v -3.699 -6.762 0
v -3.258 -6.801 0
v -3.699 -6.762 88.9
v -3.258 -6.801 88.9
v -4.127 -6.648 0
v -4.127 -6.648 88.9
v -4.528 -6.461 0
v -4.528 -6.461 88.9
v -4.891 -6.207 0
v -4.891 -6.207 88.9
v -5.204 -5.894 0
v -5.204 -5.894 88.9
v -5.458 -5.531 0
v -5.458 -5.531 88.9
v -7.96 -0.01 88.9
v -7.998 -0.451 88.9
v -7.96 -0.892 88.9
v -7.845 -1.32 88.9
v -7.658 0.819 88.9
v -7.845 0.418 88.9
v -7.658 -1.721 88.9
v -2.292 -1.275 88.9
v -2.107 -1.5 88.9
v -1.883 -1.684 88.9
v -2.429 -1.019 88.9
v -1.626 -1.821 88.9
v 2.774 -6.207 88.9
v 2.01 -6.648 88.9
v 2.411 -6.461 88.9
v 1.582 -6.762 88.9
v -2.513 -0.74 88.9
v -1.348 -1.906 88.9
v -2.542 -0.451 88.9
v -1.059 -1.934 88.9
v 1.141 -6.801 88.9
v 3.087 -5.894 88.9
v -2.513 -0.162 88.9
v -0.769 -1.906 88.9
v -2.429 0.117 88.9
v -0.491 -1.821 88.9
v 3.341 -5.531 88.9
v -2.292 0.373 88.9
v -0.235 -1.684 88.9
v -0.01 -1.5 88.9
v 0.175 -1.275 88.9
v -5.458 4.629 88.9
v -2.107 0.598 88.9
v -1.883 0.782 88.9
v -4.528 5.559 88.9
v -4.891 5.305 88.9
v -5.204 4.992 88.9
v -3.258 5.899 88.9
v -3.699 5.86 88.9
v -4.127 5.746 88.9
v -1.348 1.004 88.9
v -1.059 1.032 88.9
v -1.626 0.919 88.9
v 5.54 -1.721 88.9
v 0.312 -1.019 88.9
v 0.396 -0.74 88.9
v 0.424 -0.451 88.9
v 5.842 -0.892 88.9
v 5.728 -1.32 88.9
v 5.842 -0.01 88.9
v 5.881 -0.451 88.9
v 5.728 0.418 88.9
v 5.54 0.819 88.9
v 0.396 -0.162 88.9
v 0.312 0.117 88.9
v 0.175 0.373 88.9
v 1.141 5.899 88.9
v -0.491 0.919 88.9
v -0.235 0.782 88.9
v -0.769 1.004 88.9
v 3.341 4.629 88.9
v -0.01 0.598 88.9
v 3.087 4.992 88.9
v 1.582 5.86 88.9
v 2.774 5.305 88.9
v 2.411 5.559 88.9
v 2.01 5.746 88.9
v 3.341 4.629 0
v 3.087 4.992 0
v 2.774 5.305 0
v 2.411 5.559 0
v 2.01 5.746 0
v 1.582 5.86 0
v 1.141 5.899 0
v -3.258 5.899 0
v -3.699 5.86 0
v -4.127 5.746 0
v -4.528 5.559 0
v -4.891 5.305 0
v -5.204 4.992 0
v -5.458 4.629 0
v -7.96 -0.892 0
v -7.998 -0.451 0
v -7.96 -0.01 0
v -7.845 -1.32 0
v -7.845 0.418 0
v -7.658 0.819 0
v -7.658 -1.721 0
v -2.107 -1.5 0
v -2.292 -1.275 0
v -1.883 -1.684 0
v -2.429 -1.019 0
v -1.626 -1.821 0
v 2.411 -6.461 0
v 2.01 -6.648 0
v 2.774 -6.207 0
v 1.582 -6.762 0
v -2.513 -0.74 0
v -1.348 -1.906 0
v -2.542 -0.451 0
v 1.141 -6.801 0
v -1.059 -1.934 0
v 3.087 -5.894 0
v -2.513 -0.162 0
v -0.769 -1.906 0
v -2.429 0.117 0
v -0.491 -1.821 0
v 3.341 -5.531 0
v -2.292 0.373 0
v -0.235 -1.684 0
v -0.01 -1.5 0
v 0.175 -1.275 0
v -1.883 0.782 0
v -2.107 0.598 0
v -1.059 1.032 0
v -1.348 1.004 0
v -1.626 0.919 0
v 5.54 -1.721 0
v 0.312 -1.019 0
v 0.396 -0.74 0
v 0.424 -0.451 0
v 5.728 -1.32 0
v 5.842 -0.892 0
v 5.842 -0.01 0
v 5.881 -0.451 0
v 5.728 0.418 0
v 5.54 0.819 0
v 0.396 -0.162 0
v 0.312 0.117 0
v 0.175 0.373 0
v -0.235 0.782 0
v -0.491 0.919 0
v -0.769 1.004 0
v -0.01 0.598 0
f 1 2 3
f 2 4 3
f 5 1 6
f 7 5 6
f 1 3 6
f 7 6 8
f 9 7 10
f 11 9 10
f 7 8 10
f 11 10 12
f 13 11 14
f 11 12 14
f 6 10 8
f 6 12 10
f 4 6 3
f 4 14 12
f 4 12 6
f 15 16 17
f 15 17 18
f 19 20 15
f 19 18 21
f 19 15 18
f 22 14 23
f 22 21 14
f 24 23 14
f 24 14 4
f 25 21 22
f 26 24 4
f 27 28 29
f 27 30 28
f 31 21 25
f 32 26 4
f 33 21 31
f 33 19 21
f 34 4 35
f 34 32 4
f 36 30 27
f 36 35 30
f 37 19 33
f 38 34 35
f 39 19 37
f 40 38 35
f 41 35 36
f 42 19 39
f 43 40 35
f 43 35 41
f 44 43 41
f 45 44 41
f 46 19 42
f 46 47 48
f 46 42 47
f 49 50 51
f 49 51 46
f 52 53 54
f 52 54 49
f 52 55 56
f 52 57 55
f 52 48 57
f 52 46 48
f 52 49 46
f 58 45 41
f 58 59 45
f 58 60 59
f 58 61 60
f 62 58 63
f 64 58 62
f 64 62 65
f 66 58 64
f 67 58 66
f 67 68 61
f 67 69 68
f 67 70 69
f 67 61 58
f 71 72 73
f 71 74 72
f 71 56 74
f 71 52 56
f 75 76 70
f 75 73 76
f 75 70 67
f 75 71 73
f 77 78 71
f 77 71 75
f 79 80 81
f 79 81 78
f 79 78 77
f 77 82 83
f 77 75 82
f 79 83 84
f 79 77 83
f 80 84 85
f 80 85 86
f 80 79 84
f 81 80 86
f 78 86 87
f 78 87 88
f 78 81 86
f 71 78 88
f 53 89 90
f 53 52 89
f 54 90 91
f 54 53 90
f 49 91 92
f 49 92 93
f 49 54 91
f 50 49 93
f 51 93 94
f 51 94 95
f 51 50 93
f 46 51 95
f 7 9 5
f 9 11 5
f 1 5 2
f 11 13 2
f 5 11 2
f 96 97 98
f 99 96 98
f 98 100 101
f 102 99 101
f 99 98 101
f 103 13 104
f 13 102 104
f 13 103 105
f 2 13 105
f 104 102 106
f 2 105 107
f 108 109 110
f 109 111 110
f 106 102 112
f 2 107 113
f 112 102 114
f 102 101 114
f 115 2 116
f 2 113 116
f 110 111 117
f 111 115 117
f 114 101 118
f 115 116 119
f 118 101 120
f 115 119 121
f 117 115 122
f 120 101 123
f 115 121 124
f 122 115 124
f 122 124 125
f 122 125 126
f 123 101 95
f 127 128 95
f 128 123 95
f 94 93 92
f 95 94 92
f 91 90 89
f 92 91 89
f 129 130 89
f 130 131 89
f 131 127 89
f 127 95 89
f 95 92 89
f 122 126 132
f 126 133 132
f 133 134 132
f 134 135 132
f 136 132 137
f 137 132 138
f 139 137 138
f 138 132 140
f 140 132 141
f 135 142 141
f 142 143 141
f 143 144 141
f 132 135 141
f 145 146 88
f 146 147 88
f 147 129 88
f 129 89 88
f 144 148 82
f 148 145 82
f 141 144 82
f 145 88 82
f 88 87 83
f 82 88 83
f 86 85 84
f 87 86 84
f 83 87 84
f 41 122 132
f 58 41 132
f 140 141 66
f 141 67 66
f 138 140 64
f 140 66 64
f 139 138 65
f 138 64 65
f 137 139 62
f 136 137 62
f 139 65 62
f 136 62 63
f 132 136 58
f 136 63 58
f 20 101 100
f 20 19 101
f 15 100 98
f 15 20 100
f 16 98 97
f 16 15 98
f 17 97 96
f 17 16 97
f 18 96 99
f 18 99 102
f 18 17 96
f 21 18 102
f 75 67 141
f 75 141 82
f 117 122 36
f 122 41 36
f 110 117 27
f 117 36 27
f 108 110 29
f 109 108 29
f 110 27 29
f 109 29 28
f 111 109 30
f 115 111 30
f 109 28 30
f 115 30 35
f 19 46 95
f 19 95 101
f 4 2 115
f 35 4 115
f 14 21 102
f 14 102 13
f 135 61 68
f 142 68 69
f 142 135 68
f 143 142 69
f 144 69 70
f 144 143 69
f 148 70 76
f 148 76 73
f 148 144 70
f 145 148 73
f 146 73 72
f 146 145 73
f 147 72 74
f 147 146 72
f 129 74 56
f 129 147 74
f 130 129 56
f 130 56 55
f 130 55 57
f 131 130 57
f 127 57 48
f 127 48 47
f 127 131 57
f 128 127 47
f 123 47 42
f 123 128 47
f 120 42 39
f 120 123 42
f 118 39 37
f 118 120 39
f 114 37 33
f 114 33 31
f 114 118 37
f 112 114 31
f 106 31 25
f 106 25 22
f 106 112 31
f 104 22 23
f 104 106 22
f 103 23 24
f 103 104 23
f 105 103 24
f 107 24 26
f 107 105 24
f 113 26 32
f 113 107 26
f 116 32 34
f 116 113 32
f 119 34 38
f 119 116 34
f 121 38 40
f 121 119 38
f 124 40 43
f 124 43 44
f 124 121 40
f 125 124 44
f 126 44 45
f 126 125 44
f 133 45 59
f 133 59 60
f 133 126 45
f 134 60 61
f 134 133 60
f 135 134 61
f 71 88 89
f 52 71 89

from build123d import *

# Parameters (mm, degrees)
SKETCH1_R           = 1.483161667
BOSS_EXTRUDE1_DEPTH = 88.9
FILLET1_R           = 2.54


with BuildPart() as part:
    # Sketch1 → Boss-Extrude1 (new body)
    with BuildSketch(Plane.XY):
        Polygon((6.273667096, -0.450919823), (2.607492887, 5.899080177), (-4.724855532, 5.899080177), (-8.391029741, -0.450919823), (-4.724855532, -6.800919823), (2.607492887, -6.800919823), align=None)
        with Locations((-1.058681322, -0.450919823)):
            Circle(SKETCH1_R, mode=Mode.SUBTRACT)
    extrude(amount=BOSS_EXTRUDE1_DEPTH)

    # Fillet1
    fillet1_edges = [part.edges().sort_by_distance(p)[0] for p in [
        (2.607492887, -6.800919823, 44.45),
        (-4.724855532, -6.800919823, 44.45),
        (-8.391029741, -0.450919823, 44.45),
        (-4.724855532, 5.899080177, 44.45),
        (2.607492887, 5.899080177, 44.45),
        (6.273667096, -0.450919823, 44.45),
    ]]
    fillet(fillet1_edges, radius=FILLET1_R)


solid = part.part
